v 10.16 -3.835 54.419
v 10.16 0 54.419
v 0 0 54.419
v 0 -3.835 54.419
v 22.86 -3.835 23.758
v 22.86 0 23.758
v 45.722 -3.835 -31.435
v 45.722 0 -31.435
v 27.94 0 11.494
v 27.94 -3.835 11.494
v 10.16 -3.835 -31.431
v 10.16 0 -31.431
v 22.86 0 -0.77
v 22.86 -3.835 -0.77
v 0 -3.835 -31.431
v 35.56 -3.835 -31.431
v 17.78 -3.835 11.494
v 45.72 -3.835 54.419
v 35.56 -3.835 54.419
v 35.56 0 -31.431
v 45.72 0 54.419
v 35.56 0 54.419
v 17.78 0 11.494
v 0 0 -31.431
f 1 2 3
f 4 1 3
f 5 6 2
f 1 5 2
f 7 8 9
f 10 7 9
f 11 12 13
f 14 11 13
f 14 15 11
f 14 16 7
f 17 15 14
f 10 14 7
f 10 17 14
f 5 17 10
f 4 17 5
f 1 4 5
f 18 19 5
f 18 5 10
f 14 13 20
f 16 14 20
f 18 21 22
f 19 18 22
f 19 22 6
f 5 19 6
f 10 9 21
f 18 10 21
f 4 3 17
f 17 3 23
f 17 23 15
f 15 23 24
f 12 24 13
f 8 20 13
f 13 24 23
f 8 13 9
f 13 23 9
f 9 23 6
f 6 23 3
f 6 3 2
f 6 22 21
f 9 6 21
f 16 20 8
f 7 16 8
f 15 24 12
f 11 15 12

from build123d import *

# Parameters (mm, degrees)
F1_DEPTH = 6.3754
F2_DEPTH = 2.54


with BuildPart() as f1:
    # F0 (on Front) → F1 (new body)
    with BuildSketch(Plane.XZ):
        Polygon((35.56, 54.4186271727), (22.86, 23.7581149306), (27.94, 11.4939100337), (45.72, 54.4186271727), align=None)
        Polygon((22.86, 23.7581149306), (10.16, 54.4186271727), (0, 54.4186271727), (17.78, 11.4939100337), align=None)
        Polygon((27.94, 11.4939100337), (22.86, 23.7581149306), (17.78, 11.4939100337), (22.86, -0.7702948631), align=None)
        Polygon((45.7218143962, -31.4351874453), (27.94, 11.4939100337), (22.86, -0.7702948631), (35.56, -31.4308071053), align=None)
        Polygon((22.86, -0.7702948631), (17.78, 11.4939100337), (0, -31.4308071053), (10.16, -31.4308071053), align=None)
    extrude(amount=F1_DEPTH)

    # F2 (cut): a face of the model
    f2_faces = [f1.faces().sort_by_distance(p)[0] for p in [
        (22.8602675118, -6.3754, 11.4933203606),
    ]]
    extrude(f2_faces, amount=-F2_DEPTH, mode=Mode.SUBTRACT)


solid = f1.part
